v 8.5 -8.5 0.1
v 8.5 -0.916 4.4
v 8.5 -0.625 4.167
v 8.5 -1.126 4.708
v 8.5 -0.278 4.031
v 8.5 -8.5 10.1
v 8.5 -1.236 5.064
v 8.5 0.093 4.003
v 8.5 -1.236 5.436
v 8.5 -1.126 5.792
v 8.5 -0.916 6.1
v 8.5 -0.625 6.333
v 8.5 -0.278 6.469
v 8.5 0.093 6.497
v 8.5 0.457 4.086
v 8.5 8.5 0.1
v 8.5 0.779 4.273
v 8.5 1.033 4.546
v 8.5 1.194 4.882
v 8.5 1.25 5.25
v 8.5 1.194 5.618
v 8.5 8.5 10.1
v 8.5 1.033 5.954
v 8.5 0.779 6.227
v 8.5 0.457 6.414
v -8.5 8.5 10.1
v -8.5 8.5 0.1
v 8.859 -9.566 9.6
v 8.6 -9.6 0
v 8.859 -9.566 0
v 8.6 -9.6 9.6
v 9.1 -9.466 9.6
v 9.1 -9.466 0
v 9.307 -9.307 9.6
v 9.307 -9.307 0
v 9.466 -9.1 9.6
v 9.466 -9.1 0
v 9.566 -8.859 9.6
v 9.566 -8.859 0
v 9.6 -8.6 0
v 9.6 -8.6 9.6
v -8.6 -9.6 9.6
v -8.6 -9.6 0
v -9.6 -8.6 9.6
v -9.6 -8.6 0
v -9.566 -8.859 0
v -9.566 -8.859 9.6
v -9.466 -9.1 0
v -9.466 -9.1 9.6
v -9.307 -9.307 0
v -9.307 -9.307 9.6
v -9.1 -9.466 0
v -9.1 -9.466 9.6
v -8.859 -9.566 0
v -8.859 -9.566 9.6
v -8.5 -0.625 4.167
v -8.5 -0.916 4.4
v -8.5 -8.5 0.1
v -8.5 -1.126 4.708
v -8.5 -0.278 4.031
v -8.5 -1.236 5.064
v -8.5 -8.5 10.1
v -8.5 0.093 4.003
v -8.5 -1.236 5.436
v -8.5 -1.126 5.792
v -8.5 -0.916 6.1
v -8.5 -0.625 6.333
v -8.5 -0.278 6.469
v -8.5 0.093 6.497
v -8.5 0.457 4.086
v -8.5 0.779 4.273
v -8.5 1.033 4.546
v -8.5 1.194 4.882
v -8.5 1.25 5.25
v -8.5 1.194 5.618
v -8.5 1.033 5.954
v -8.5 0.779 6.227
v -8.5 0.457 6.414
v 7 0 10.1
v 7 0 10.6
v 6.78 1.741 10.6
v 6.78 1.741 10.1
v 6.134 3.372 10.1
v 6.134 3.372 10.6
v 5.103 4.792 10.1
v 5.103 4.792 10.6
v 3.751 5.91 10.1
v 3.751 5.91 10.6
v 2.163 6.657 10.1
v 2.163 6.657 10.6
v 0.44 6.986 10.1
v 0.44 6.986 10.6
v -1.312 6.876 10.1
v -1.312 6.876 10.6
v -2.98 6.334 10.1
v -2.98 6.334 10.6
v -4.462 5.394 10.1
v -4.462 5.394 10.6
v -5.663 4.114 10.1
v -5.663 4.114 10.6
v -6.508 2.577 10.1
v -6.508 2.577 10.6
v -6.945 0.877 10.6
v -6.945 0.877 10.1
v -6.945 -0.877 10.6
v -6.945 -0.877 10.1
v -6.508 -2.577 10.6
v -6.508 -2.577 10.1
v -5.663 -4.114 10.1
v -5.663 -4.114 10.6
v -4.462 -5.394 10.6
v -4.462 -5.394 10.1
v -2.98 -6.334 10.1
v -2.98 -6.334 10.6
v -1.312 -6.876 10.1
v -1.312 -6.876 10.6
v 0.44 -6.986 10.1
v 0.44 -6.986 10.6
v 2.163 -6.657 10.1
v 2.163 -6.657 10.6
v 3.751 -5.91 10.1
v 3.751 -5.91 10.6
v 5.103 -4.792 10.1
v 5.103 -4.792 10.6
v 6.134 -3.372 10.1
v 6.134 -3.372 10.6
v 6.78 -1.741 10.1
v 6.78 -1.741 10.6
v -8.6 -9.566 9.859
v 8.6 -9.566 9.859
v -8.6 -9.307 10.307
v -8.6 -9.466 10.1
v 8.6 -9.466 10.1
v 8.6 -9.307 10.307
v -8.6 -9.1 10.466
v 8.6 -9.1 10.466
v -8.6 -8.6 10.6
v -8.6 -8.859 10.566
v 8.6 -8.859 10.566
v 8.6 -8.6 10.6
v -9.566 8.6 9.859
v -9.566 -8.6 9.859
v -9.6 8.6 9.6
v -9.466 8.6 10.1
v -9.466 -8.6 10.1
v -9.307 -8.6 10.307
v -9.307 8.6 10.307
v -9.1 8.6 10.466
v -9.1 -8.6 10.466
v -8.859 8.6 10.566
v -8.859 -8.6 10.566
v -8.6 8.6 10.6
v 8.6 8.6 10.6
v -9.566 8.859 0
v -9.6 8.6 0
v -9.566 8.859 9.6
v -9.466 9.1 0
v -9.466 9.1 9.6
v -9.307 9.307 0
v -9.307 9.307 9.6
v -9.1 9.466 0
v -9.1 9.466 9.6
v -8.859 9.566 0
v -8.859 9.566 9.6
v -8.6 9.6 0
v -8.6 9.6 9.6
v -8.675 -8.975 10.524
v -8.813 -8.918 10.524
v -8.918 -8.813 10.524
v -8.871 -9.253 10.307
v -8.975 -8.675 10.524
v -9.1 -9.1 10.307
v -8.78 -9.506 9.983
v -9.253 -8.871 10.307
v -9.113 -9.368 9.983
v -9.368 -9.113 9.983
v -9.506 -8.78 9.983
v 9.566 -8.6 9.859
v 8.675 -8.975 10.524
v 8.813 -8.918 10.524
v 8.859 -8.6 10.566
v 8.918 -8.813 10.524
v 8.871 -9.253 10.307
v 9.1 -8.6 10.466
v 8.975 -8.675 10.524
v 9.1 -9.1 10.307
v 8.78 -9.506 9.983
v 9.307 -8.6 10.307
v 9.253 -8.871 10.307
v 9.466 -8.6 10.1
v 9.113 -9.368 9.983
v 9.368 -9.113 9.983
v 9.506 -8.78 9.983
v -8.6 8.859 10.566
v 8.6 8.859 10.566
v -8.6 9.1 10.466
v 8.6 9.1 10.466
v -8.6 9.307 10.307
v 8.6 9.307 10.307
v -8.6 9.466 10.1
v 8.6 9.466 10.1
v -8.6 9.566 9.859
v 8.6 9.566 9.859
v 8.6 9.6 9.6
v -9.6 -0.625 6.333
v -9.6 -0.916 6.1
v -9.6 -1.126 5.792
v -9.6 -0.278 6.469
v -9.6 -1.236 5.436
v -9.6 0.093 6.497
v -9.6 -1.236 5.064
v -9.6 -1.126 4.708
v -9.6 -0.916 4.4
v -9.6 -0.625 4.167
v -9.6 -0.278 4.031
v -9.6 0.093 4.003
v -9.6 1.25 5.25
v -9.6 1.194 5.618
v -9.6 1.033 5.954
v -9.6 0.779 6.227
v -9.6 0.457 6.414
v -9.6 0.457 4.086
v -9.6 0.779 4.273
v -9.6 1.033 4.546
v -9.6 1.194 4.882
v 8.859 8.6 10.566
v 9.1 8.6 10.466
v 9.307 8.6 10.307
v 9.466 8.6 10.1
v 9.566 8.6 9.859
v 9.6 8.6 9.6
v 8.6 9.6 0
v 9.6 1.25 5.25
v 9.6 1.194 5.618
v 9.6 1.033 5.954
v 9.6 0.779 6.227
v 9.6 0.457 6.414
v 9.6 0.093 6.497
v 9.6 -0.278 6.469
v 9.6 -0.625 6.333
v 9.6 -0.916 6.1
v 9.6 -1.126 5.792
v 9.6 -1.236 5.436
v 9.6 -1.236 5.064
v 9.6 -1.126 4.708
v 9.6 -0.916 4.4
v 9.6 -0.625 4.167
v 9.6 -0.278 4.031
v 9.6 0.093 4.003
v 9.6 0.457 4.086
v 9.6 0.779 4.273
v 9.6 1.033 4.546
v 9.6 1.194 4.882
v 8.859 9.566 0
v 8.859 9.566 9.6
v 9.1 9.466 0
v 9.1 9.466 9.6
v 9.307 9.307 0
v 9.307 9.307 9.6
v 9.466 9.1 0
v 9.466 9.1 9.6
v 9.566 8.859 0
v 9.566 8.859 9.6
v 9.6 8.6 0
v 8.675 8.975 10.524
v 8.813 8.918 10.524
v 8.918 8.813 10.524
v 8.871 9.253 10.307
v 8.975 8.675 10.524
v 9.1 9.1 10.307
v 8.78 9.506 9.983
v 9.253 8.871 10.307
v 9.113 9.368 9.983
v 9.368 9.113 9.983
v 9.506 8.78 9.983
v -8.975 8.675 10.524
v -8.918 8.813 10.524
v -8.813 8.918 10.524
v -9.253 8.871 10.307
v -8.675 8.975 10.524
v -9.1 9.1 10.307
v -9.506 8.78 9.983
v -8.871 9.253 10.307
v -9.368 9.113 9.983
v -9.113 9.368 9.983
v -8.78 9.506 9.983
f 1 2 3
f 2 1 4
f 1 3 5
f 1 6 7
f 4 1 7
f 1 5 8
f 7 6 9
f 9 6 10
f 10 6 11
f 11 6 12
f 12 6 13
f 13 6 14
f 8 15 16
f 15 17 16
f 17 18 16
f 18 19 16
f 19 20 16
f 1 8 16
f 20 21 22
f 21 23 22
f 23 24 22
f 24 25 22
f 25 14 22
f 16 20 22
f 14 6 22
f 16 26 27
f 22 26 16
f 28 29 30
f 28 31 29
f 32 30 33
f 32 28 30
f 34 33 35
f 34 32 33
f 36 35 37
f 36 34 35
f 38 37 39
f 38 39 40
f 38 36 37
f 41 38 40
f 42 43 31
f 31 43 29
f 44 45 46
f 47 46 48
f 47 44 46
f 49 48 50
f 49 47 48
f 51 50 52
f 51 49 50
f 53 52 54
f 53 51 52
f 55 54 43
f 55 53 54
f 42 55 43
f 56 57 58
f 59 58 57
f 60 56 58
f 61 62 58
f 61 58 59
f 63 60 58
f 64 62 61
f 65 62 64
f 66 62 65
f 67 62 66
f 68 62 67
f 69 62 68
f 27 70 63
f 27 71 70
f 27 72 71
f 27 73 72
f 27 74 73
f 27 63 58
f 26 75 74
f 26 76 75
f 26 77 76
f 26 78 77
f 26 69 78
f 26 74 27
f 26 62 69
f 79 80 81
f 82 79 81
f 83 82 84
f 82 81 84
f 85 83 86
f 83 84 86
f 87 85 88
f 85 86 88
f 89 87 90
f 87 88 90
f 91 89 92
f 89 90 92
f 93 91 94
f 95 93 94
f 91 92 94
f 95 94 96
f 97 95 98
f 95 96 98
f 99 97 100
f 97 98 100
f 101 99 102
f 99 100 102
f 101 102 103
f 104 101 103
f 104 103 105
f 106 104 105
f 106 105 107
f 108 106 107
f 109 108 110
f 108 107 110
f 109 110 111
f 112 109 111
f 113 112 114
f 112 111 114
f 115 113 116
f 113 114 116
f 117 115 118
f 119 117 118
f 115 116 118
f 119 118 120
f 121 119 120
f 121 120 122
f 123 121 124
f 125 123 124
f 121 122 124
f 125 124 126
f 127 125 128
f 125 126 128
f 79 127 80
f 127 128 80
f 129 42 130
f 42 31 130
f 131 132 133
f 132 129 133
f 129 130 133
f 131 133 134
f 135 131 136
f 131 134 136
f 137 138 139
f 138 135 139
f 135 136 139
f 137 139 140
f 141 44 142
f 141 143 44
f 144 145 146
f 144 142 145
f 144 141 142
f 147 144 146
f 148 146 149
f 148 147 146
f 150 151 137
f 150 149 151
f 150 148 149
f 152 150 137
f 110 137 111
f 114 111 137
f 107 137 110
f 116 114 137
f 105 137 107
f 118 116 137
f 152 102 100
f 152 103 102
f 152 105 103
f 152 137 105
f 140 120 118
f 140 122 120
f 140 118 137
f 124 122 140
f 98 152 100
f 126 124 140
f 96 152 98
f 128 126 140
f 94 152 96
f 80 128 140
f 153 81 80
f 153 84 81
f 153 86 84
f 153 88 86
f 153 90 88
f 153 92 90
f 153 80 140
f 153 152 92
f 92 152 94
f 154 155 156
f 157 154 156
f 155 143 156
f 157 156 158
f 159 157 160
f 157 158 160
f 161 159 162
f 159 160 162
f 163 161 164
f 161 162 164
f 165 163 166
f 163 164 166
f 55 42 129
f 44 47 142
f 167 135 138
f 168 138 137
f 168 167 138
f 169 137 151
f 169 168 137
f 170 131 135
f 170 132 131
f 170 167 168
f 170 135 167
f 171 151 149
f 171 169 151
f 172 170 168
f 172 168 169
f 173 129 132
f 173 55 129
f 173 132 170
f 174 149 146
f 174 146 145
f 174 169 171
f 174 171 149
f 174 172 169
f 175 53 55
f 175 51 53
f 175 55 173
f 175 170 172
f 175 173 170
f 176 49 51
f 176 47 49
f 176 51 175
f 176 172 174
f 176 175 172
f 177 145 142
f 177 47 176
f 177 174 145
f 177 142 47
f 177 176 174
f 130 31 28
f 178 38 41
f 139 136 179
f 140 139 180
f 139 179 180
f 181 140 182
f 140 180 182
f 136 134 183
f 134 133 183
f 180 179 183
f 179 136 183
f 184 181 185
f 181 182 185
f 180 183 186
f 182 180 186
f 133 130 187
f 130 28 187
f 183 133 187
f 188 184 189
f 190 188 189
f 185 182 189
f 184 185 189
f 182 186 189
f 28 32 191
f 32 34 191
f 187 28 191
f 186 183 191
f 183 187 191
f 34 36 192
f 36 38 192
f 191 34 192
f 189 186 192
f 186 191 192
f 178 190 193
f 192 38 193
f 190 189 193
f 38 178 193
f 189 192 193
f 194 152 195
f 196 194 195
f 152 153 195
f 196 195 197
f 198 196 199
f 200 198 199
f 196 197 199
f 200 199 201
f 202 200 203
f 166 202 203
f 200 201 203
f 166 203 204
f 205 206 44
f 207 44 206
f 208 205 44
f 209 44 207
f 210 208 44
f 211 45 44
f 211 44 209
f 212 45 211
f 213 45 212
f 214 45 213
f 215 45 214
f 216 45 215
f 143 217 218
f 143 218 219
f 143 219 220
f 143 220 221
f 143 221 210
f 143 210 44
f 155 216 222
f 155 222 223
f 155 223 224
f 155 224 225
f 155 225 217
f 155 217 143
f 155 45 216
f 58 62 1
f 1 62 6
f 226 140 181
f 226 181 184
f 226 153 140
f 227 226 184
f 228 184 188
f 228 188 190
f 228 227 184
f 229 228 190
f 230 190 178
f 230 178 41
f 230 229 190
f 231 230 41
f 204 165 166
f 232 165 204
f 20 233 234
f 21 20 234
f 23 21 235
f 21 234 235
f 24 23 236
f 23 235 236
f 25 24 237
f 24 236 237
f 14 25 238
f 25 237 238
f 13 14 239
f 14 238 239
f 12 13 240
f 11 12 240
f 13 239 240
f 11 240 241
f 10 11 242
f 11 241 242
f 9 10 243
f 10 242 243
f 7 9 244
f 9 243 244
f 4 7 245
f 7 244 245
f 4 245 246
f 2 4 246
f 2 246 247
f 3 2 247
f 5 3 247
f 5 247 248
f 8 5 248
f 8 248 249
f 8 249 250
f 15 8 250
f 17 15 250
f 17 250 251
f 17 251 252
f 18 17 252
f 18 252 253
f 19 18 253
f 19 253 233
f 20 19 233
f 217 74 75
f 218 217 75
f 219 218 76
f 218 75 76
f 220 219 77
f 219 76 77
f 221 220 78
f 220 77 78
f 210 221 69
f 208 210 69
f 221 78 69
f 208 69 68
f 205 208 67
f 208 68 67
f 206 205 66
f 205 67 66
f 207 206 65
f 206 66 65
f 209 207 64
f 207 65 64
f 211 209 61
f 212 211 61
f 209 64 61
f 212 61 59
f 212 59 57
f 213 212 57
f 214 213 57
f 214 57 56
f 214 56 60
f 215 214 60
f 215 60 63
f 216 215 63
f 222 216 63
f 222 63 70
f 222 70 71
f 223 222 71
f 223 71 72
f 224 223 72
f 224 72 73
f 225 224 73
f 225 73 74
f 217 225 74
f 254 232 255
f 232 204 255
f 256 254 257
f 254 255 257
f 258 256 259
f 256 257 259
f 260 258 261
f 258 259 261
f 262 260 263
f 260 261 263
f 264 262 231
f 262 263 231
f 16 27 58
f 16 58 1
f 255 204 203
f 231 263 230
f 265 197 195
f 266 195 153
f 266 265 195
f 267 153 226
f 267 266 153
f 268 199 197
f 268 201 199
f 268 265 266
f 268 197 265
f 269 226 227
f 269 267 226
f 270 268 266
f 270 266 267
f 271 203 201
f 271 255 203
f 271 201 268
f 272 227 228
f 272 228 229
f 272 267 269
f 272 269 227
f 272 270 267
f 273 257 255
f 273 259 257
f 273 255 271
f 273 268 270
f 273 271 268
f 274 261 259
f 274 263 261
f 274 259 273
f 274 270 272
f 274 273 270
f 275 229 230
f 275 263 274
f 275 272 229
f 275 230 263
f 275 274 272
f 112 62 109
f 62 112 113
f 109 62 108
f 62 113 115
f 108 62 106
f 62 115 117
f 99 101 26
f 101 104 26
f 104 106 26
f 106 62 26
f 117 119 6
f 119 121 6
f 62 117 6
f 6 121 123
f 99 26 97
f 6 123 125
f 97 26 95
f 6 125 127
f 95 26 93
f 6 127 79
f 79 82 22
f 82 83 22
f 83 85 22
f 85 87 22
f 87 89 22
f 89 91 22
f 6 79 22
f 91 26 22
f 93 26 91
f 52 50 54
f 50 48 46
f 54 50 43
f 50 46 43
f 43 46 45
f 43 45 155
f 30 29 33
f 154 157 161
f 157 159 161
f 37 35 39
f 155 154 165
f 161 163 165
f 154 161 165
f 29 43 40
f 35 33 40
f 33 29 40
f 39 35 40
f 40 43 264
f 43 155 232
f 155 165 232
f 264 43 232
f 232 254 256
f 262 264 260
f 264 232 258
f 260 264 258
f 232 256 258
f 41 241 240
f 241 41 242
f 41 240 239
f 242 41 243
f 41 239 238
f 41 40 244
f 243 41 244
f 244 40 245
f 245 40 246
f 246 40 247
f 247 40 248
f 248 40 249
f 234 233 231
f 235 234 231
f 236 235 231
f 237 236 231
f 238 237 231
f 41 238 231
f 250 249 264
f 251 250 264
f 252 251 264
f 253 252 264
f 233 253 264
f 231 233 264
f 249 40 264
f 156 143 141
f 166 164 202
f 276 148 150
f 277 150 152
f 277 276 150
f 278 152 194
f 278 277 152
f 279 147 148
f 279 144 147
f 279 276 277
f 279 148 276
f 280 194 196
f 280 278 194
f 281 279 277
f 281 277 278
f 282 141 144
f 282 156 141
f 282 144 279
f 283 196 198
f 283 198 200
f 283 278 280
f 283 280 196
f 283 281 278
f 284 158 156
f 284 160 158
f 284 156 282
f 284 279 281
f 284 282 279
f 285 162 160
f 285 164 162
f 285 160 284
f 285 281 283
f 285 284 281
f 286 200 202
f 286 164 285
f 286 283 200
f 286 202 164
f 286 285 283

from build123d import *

# Parameters (mm, degrees)
SKETCH_W        = 19.2
SKETCH_H        = 19.2
PAD_DEPTH       = 10.6
SKETCH001_R     = 1.25
POCKET_DEPTH    = 19.201
SKETCH002_R     = 7
POCKET001_DEPTH = 0.5
SKETCH003_W     = 17
SKETCH003_H     = 17
POCKET002_DEPTH = 10
FILLET_R        = 1


with BuildPart() as part:
    # Sketch → Pad (new body)
    with BuildSketch(Plane.XY):
        Rectangle(SKETCH_W, SKETCH_H)
    extrude(amount=PAD_DEPTH)

    # Sketch001 (on Face2 of Pad) → Pocket (cut, through all)
    with BuildSketch(Plane.YZ.offset(9.6)):
        with Locations((0, 5.25)):
            Circle(SKETCH001_R)
    extrude(amount=-POCKET_DEPTH, mode=Mode.SUBTRACT)

    # Sketch002 (on Face5 of Pocket) → Pocket001 (cut)
    with BuildSketch(Plane.XY.offset(10.6)):
        Circle(SKETCH002_R)
    extrude(amount=-POCKET001_DEPTH, mode=Mode.SUBTRACT)

    # Sketch003 (on Face9 of Pocket001) → Pocket002 (cut)
    with BuildSketch(Plane.XY.offset(10.1)):
        Rectangle(SKETCH003_W, SKETCH003_H)
    extrude(amount=-POCKET002_DEPTH, mode=Mode.SUBTRACT)

    # Fillet
    fillet_edges = [part.edges().sort_by_distance(p)[0] for p in [
        (9.6, -9.6, 5.3),
        (-9.6, -9.6, 5.3),
        (9.6, 9.6, 5.3),
        (-9.6, 9.6, 5.3),
        (0, -9.6, 10.6),
        (-9.6, 0, 10.6),
        (0, 9.6, 10.6),
        (9.6, 0, 10.6),
    ]]
    fillet(fillet_edges, radius=FILLET_R)


solid = part.part
